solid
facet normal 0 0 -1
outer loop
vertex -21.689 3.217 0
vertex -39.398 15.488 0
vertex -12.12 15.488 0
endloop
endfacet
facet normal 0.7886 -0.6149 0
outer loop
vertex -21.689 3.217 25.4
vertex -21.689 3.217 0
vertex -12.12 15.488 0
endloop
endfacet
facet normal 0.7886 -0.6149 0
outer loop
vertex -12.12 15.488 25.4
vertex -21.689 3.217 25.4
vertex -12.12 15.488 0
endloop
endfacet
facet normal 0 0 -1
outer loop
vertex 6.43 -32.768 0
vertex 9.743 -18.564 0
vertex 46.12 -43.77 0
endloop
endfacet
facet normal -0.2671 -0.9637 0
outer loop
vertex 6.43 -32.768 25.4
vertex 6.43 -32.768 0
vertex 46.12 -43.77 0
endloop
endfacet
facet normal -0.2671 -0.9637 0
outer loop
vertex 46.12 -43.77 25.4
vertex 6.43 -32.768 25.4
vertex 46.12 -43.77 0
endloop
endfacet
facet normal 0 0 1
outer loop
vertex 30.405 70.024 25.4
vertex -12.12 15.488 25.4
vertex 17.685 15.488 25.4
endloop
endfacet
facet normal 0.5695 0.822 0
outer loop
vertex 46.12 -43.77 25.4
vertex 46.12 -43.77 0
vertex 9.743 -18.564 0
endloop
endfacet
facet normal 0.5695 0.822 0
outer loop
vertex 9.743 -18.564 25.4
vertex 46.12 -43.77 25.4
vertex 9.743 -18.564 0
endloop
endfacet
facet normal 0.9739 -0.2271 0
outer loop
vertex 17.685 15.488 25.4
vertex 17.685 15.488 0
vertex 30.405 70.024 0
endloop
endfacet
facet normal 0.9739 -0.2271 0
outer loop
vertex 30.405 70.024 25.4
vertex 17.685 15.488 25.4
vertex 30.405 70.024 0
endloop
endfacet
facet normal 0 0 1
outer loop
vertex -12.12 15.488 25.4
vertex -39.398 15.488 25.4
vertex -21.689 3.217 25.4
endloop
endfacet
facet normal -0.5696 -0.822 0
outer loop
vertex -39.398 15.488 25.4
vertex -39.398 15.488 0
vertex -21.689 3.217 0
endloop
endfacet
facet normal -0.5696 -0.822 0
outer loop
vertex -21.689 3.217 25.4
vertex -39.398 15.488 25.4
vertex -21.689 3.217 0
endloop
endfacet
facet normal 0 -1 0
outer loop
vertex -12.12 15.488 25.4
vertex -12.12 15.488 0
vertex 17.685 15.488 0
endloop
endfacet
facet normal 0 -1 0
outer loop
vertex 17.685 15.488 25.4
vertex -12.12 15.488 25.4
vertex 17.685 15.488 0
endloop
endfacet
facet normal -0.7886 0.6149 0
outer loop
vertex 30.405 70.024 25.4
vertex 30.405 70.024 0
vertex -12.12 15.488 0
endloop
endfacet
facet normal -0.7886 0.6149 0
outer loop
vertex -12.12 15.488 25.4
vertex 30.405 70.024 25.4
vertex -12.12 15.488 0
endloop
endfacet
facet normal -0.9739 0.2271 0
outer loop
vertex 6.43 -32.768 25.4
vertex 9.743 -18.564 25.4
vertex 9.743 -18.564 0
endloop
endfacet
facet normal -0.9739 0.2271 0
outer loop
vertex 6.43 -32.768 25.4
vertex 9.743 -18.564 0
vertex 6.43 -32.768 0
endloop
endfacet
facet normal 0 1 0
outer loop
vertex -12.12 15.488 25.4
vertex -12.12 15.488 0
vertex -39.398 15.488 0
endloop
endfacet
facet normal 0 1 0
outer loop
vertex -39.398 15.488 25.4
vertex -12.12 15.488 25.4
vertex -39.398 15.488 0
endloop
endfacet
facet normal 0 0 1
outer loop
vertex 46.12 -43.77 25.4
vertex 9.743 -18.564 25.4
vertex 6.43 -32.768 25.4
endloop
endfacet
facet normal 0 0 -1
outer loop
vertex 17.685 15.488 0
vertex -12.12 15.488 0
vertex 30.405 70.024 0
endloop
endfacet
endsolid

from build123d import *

# Parameters (mm, degrees)
F1_DEPTH = 25.4


with BuildPart() as f1:
    # F0 (on Top) → F1 (new body)
    with BuildSketch(Plane.XY):
        Polygon((46.1199507117, -43.770454824), (9.7432314694, -18.5636266851), (6.4303332797, -32.7676333823), align=None)
    extrude(amount=F1_DEPTH)


with BuildPart() as f1b:
    # F0 (on Top) → F1, piece 2 (new body)
    with BuildSketch(Plane.XY):
        Polygon((-21.6892235965, 3.2171306052), (-12.1204680922, 15.4882743955), (-39.3980741501, 15.4882743955), align=None)
    extrude(amount=F1_DEPTH)


with BuildPart() as f1c:
    # F0 (on Top) → F1, piece 3 (new body)
    with BuildSketch(Plane.XY):
        Polygon((-12.1204680922, 15.4882743955), (17.6853905975, 15.4882743955), (30.4050892591, 70.0238123536), align=None)
    extrude(amount=F1_DEPTH)


solid = Compound([f1.part, f1b.part, f1c.part])
